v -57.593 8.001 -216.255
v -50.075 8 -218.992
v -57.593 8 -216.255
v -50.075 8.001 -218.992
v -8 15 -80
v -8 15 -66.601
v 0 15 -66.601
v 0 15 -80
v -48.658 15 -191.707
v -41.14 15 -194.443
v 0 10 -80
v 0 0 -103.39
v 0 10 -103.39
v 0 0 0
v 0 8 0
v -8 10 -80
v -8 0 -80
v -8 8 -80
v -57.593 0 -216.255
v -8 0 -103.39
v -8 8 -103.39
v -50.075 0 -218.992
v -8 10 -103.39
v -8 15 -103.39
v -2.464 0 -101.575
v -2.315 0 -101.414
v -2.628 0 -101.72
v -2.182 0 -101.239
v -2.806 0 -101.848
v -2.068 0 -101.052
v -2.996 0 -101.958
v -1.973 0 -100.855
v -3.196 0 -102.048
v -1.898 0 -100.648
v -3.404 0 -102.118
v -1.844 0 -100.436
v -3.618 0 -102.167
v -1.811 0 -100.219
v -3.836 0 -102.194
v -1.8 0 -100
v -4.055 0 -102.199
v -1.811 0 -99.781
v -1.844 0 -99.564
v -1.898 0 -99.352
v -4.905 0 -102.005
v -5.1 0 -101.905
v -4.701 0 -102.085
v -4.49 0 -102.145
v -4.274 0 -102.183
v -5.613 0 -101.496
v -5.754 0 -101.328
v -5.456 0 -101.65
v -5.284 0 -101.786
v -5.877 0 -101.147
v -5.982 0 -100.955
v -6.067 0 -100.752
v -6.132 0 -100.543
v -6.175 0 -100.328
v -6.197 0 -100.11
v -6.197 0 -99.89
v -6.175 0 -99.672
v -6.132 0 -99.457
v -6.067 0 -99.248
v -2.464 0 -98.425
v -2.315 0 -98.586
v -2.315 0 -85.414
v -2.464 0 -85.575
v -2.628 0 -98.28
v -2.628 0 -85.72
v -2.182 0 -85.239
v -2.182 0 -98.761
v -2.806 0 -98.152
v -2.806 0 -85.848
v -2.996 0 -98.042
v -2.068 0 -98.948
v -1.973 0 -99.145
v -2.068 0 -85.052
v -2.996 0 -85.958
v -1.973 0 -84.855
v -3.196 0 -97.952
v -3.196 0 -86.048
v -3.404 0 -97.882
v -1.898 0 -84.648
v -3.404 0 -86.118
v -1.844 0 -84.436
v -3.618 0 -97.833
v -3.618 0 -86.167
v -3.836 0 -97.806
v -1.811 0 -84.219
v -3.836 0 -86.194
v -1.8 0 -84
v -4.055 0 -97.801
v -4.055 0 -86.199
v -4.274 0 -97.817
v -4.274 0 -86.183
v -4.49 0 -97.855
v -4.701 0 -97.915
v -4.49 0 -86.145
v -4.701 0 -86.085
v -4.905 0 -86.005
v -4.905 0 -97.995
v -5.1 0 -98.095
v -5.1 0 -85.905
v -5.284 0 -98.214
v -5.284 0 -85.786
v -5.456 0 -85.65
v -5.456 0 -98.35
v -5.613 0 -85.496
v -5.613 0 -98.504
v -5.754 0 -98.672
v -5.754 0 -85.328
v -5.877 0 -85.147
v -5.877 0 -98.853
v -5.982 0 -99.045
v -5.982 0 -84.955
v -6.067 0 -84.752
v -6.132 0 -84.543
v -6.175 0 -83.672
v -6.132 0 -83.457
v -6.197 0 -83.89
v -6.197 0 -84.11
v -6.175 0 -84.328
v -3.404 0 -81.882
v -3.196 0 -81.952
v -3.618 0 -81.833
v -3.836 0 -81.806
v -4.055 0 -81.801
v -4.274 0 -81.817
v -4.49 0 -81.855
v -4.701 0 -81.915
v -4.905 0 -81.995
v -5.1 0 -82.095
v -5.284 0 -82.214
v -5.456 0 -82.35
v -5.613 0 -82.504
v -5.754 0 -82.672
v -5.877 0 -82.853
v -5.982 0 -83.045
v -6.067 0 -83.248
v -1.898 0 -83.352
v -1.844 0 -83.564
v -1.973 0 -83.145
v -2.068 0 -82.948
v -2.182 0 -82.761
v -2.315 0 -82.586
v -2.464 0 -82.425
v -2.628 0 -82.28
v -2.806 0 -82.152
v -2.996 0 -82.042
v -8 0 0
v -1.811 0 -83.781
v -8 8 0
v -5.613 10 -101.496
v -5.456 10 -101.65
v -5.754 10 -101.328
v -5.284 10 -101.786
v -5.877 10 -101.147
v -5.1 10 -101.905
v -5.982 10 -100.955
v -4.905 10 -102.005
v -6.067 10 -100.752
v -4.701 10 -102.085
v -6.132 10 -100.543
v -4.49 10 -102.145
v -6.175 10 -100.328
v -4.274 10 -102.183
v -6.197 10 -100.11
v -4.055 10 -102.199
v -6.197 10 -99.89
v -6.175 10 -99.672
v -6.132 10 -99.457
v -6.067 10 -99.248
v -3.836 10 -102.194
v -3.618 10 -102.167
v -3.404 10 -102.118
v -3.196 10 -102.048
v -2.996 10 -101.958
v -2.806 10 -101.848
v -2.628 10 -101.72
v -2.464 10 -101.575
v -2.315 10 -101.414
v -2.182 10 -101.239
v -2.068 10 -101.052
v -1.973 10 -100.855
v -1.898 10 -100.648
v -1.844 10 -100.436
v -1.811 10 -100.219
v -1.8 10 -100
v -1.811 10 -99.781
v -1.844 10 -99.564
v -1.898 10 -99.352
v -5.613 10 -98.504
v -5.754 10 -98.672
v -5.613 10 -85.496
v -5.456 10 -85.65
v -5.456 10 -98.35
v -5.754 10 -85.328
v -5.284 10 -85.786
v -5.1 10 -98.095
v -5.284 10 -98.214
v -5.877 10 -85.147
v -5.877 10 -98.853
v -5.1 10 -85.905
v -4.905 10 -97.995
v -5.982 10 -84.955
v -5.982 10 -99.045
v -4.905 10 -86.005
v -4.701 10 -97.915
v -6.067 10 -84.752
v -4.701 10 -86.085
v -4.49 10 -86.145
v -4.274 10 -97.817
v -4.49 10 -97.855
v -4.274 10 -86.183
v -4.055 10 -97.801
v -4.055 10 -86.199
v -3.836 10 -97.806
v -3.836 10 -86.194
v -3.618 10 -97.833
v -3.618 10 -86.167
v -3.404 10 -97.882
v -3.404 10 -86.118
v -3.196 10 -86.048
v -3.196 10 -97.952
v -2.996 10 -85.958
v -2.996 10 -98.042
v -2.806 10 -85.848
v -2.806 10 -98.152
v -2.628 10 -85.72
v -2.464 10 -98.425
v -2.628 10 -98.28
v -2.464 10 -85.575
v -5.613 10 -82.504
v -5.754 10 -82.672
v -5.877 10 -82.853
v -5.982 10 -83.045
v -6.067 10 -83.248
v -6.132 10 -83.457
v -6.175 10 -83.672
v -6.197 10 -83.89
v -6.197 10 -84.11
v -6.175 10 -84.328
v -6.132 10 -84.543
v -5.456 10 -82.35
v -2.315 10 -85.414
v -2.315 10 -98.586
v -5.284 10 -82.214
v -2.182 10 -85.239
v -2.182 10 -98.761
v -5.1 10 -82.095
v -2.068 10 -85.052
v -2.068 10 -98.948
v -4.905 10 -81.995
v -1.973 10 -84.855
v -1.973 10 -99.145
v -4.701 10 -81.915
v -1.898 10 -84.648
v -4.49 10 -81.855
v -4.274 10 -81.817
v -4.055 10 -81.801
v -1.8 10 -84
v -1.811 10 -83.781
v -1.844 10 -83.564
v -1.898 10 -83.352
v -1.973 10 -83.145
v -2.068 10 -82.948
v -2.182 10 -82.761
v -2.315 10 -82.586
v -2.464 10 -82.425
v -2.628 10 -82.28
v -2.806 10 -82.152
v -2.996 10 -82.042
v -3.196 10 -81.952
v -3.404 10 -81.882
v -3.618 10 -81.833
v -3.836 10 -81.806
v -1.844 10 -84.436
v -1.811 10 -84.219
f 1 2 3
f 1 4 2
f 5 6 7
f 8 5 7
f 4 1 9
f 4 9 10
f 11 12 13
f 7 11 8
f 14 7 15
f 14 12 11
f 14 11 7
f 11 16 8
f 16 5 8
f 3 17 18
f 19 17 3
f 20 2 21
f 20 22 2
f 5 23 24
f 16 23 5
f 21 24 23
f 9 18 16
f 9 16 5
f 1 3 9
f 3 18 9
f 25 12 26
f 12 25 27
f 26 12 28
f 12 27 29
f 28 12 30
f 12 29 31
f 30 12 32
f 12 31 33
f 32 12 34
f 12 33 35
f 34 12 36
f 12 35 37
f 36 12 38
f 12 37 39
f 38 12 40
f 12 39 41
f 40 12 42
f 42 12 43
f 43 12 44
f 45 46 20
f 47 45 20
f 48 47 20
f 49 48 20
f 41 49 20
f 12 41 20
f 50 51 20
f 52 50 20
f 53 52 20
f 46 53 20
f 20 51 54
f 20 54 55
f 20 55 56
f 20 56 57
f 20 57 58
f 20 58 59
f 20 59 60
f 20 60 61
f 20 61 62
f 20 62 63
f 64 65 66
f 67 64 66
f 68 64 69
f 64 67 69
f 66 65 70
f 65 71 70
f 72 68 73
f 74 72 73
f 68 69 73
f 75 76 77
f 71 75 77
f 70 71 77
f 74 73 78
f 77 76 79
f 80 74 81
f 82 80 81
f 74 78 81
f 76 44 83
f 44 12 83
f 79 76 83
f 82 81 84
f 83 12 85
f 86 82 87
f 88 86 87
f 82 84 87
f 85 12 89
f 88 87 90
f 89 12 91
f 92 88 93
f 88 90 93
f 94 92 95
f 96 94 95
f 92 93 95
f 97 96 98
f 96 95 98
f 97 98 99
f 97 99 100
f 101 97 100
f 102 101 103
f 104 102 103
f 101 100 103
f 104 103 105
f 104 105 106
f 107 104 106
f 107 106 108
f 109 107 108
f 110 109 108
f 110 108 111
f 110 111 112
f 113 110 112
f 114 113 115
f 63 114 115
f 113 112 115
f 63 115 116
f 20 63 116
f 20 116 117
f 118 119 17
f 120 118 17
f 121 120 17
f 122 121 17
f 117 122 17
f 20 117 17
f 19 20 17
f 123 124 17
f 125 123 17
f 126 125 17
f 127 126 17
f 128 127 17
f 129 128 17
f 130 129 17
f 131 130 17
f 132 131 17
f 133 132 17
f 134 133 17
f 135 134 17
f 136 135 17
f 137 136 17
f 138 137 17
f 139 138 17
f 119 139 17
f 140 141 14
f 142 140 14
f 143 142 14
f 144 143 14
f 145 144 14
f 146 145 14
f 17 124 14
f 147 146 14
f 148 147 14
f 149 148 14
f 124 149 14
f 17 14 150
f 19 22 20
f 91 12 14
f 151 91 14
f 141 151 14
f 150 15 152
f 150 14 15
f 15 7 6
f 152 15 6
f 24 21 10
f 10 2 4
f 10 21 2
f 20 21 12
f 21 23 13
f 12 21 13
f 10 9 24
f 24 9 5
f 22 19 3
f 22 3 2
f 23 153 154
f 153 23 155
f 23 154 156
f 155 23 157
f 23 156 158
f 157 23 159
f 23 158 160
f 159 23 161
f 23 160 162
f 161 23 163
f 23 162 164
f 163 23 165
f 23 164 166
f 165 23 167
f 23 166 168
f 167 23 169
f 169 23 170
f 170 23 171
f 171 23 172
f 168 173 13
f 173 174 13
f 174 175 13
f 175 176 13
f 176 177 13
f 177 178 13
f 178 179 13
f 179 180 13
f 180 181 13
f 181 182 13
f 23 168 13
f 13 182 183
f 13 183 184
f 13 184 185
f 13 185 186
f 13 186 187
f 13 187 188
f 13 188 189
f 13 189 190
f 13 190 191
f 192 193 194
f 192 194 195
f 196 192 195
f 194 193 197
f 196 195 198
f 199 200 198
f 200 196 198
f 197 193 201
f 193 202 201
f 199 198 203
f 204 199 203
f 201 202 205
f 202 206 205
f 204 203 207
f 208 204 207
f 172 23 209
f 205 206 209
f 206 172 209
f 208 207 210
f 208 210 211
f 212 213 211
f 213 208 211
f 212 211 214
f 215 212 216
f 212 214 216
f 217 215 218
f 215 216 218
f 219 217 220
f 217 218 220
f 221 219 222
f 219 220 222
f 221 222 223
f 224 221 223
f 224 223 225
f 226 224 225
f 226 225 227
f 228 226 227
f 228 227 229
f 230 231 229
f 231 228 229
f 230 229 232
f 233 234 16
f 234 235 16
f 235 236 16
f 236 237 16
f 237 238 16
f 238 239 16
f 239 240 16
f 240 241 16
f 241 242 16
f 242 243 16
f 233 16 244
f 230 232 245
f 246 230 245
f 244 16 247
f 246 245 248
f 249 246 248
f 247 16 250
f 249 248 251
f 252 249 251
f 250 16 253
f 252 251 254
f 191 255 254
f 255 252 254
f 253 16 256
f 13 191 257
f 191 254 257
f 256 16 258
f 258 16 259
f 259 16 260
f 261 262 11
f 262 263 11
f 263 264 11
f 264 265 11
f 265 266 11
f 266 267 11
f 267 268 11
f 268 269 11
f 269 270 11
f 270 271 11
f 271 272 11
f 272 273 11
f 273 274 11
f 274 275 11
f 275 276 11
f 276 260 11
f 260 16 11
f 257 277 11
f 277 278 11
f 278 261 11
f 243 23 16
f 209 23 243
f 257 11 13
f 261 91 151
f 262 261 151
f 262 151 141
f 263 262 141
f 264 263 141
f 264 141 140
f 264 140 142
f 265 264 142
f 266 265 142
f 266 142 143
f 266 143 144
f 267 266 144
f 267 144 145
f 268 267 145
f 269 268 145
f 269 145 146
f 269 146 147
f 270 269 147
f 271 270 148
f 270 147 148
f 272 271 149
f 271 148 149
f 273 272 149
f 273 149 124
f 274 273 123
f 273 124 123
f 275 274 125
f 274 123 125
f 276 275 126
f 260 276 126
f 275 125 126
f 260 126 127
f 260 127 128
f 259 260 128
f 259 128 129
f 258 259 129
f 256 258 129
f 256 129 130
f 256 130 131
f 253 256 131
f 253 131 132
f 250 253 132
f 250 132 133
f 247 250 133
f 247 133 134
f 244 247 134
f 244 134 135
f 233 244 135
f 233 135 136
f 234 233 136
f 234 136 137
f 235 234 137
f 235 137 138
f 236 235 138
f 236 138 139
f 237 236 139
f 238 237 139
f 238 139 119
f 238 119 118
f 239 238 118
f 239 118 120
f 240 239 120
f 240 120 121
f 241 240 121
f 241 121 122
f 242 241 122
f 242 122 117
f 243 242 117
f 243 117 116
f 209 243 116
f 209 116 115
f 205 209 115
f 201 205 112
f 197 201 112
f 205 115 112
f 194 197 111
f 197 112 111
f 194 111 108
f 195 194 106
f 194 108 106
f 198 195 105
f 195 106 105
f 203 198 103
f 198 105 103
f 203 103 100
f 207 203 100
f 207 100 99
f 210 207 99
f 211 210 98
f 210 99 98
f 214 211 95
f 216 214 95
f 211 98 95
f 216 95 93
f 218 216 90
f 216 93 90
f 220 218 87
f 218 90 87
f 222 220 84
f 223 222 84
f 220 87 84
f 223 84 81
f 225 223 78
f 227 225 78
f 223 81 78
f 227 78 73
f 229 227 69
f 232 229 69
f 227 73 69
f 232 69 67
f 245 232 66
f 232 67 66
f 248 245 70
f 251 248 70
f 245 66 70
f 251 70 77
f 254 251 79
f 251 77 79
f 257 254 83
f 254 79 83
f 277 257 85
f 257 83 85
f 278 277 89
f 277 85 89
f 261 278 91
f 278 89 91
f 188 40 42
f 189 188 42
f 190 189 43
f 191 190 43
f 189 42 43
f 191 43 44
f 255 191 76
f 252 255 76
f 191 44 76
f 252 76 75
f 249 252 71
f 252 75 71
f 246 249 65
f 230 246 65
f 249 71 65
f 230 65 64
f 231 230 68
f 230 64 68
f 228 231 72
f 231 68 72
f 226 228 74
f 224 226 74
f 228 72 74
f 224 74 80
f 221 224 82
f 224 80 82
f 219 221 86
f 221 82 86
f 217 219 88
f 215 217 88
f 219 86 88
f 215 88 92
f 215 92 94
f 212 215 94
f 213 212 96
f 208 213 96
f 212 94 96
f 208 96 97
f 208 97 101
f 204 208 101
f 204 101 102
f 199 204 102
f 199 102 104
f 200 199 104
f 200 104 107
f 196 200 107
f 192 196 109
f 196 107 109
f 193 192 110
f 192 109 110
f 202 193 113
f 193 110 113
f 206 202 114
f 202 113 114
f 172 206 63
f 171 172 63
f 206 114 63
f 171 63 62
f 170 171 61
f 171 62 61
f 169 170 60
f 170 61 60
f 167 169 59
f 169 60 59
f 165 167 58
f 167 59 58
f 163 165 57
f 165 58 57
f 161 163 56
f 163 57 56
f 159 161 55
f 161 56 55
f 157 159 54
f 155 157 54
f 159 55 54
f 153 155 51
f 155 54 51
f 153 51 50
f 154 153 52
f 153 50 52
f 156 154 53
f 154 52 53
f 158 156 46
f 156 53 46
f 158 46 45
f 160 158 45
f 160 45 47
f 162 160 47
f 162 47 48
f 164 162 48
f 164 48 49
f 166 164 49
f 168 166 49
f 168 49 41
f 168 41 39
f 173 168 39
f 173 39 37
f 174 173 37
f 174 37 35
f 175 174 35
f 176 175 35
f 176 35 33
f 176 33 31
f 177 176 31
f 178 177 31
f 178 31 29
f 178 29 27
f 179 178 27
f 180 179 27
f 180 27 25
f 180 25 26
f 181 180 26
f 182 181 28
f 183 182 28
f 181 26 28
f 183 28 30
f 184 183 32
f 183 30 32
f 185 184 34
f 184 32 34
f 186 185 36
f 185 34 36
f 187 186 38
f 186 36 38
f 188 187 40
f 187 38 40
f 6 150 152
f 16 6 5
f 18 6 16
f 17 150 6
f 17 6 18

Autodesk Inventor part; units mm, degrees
ref_plane "YZ Plane" through (0, 0, 0) normal (1, 0, 0) x (0, 1, 0)
ref_plane "XZ Plane" through (0, 0, 0) normal (0, 1, 0) x (-1, 0, 0)
ref_plane "XY Plane" through (0, 0, 0) normal (0, 0, 1) x (1, 0, 0)
sketch "Sketch1" plane through (0, 0, 0) normal (0, 1, 0) x (-1, 0, 0)
  line L0 (0, 0) -> (8, 0)
  line L1 (8, 0) -> (8, -80)
  line L2 (0, -80) -> (0, 0)
  line L3 (8, -80) -> (57.5929, -216.2554)
  line L4 (8, -80) -> (153, -80) construction
  line L5 (57.5929, -216.2554) -> (50.0754, -218.9916)
  line L6 (50.0754, -218.9916) -> (0.4825, -82.7362)
  line L7 (0.4825, -82.7362) -> (0, -81.4106)
  line L8 (0, -81.4106) -> (0, -80)
  dimension "d3" = 8
  dimension "d4" = 80
  dimension "d6" = 70
  dimension "d7" = 8
extrude "Extrusion1" add sketch "Sketch1" along normal blind 8
sketch "Sketch2" plane through (-8, 0, 0) normal (0, 0, 1) x (1, 0, 0)
  line L0 (8, 8) -> (8, 15)
  line L1 (8, 8) -> (0, 8)
  line L2 (8, 8) -> (-42.0754, 8) projected
  line L3 (0, 8) -> (0, 15)
  line L4 (0, 15) -> (8, 15)
  point P0 (8, 0)
  dimension "d10" = 7
  dimension "d11" = 8
extrude "Extrusion2" add sketch "Sketch2" against normal blind 80
sketch "Sketch3" plane through (-57.5929, 0, -216.2554) normal (-0.342, 0, -0.9397) x (-0.9397, 0, 0.342)
  line L0 (-8, 0) -> (-8, 8) projected
  line L1 (0, 0) -> (0, 8) projected
  line L2 (-8, 8) -> (0, 8)
  line L3 (-7.5175, 15) -> (-7.5175, 8) projected
  line L4 (-8, 8) -> (-8, 15)
  line L5 (0, 8) -> (0, 15)
  line L6 (0, 15) -> (-8, 15)
  point P0 (19.8441, 0)
  dimension "d14" = 8
extrude "Extrusion3" add sketch "Sketch3" against normal blind 145
sketch "Sketch8" plane through (0, 0, 0) normal (0, -1, 0) x (1, 0, 0)
  line L0 (-8, -80) -> (-8, 0) projected
  line L1 (-8, -80) -> (0, -80)
  line L2 (0, -80) -> (0, -104)
  line L3 (0, -104) -> (-8, -104)
  line L4 (-8, -104) -> (-8, -80)
  circle A0 centre (-4, -100) radius 2.2
  circle A1 centre (-4, -84) radius 2.2
  point P0 (0, 0)
  point P1 (-4, -80)
  point P2 (-4, -104)
  dimension "d24" = 24
  dimension "d25" = 4.4
  dimension "d26" = 4.4
  dimension "d27" = 4
  dimension "d28" = 4
extrude "Extrusion7" add sketch "Sketch8" against normal blind 10
sketch "Sketch9" plane through (0, 10, 0) normal (0, 1, 0) x (1, 0, 0)
  line L0 (0, 80) -> (0, 104) projected
  line L1 (-8, 80) -> (-0.4825, 82.7362) projected
  line L2 (0, 104) -> (-8, 104)
  line L3 (-8, 104) -> (-8, 80)
  line L4 (-8, 80) -> (0, 80)
  line L5 (0, 80) -> (0, 104)
  point P0 (0, 0)
extrude "Extrusion8" cut sketch "Sketch9" along normal blind 145
extrude "Extrusion9" cut sketch "Sketch8" against normal blind 24 contours A1
chamfer "Chamfer1" distance 7 angle 84 1 edges at (-4, 15, 0) measured on face at (-5.3333, 5, 0)
chamfer "Chamfer2" distance 7 angle 75 1 edges at (-53.8342, 15, -217.6235) measured on face at (-55.0871, 5, -217.1675)
sketch "Sketch10" plane through (0, 10, 0) normal (0, 1, 0) x (1, 0, 0)
  line L0 (-8, 104) -> (0, 104) projected
  line L1 (-8, 104) -> (-8, 103.3904) projected
  line L2 (0, 104) -> (-8, 104)
  line L3 (-8, 104) -> (-8, 103.3904)
  line L4 (-8, 103.3904) -> (0, 103.3904)
  line L5 (0, 103.3904) -> (0, 104)
  point P0 (0, 0)
extrude "Extrusion10" cut sketch "Sketch10" against normal blind 10
properties part number "intake arm left"
